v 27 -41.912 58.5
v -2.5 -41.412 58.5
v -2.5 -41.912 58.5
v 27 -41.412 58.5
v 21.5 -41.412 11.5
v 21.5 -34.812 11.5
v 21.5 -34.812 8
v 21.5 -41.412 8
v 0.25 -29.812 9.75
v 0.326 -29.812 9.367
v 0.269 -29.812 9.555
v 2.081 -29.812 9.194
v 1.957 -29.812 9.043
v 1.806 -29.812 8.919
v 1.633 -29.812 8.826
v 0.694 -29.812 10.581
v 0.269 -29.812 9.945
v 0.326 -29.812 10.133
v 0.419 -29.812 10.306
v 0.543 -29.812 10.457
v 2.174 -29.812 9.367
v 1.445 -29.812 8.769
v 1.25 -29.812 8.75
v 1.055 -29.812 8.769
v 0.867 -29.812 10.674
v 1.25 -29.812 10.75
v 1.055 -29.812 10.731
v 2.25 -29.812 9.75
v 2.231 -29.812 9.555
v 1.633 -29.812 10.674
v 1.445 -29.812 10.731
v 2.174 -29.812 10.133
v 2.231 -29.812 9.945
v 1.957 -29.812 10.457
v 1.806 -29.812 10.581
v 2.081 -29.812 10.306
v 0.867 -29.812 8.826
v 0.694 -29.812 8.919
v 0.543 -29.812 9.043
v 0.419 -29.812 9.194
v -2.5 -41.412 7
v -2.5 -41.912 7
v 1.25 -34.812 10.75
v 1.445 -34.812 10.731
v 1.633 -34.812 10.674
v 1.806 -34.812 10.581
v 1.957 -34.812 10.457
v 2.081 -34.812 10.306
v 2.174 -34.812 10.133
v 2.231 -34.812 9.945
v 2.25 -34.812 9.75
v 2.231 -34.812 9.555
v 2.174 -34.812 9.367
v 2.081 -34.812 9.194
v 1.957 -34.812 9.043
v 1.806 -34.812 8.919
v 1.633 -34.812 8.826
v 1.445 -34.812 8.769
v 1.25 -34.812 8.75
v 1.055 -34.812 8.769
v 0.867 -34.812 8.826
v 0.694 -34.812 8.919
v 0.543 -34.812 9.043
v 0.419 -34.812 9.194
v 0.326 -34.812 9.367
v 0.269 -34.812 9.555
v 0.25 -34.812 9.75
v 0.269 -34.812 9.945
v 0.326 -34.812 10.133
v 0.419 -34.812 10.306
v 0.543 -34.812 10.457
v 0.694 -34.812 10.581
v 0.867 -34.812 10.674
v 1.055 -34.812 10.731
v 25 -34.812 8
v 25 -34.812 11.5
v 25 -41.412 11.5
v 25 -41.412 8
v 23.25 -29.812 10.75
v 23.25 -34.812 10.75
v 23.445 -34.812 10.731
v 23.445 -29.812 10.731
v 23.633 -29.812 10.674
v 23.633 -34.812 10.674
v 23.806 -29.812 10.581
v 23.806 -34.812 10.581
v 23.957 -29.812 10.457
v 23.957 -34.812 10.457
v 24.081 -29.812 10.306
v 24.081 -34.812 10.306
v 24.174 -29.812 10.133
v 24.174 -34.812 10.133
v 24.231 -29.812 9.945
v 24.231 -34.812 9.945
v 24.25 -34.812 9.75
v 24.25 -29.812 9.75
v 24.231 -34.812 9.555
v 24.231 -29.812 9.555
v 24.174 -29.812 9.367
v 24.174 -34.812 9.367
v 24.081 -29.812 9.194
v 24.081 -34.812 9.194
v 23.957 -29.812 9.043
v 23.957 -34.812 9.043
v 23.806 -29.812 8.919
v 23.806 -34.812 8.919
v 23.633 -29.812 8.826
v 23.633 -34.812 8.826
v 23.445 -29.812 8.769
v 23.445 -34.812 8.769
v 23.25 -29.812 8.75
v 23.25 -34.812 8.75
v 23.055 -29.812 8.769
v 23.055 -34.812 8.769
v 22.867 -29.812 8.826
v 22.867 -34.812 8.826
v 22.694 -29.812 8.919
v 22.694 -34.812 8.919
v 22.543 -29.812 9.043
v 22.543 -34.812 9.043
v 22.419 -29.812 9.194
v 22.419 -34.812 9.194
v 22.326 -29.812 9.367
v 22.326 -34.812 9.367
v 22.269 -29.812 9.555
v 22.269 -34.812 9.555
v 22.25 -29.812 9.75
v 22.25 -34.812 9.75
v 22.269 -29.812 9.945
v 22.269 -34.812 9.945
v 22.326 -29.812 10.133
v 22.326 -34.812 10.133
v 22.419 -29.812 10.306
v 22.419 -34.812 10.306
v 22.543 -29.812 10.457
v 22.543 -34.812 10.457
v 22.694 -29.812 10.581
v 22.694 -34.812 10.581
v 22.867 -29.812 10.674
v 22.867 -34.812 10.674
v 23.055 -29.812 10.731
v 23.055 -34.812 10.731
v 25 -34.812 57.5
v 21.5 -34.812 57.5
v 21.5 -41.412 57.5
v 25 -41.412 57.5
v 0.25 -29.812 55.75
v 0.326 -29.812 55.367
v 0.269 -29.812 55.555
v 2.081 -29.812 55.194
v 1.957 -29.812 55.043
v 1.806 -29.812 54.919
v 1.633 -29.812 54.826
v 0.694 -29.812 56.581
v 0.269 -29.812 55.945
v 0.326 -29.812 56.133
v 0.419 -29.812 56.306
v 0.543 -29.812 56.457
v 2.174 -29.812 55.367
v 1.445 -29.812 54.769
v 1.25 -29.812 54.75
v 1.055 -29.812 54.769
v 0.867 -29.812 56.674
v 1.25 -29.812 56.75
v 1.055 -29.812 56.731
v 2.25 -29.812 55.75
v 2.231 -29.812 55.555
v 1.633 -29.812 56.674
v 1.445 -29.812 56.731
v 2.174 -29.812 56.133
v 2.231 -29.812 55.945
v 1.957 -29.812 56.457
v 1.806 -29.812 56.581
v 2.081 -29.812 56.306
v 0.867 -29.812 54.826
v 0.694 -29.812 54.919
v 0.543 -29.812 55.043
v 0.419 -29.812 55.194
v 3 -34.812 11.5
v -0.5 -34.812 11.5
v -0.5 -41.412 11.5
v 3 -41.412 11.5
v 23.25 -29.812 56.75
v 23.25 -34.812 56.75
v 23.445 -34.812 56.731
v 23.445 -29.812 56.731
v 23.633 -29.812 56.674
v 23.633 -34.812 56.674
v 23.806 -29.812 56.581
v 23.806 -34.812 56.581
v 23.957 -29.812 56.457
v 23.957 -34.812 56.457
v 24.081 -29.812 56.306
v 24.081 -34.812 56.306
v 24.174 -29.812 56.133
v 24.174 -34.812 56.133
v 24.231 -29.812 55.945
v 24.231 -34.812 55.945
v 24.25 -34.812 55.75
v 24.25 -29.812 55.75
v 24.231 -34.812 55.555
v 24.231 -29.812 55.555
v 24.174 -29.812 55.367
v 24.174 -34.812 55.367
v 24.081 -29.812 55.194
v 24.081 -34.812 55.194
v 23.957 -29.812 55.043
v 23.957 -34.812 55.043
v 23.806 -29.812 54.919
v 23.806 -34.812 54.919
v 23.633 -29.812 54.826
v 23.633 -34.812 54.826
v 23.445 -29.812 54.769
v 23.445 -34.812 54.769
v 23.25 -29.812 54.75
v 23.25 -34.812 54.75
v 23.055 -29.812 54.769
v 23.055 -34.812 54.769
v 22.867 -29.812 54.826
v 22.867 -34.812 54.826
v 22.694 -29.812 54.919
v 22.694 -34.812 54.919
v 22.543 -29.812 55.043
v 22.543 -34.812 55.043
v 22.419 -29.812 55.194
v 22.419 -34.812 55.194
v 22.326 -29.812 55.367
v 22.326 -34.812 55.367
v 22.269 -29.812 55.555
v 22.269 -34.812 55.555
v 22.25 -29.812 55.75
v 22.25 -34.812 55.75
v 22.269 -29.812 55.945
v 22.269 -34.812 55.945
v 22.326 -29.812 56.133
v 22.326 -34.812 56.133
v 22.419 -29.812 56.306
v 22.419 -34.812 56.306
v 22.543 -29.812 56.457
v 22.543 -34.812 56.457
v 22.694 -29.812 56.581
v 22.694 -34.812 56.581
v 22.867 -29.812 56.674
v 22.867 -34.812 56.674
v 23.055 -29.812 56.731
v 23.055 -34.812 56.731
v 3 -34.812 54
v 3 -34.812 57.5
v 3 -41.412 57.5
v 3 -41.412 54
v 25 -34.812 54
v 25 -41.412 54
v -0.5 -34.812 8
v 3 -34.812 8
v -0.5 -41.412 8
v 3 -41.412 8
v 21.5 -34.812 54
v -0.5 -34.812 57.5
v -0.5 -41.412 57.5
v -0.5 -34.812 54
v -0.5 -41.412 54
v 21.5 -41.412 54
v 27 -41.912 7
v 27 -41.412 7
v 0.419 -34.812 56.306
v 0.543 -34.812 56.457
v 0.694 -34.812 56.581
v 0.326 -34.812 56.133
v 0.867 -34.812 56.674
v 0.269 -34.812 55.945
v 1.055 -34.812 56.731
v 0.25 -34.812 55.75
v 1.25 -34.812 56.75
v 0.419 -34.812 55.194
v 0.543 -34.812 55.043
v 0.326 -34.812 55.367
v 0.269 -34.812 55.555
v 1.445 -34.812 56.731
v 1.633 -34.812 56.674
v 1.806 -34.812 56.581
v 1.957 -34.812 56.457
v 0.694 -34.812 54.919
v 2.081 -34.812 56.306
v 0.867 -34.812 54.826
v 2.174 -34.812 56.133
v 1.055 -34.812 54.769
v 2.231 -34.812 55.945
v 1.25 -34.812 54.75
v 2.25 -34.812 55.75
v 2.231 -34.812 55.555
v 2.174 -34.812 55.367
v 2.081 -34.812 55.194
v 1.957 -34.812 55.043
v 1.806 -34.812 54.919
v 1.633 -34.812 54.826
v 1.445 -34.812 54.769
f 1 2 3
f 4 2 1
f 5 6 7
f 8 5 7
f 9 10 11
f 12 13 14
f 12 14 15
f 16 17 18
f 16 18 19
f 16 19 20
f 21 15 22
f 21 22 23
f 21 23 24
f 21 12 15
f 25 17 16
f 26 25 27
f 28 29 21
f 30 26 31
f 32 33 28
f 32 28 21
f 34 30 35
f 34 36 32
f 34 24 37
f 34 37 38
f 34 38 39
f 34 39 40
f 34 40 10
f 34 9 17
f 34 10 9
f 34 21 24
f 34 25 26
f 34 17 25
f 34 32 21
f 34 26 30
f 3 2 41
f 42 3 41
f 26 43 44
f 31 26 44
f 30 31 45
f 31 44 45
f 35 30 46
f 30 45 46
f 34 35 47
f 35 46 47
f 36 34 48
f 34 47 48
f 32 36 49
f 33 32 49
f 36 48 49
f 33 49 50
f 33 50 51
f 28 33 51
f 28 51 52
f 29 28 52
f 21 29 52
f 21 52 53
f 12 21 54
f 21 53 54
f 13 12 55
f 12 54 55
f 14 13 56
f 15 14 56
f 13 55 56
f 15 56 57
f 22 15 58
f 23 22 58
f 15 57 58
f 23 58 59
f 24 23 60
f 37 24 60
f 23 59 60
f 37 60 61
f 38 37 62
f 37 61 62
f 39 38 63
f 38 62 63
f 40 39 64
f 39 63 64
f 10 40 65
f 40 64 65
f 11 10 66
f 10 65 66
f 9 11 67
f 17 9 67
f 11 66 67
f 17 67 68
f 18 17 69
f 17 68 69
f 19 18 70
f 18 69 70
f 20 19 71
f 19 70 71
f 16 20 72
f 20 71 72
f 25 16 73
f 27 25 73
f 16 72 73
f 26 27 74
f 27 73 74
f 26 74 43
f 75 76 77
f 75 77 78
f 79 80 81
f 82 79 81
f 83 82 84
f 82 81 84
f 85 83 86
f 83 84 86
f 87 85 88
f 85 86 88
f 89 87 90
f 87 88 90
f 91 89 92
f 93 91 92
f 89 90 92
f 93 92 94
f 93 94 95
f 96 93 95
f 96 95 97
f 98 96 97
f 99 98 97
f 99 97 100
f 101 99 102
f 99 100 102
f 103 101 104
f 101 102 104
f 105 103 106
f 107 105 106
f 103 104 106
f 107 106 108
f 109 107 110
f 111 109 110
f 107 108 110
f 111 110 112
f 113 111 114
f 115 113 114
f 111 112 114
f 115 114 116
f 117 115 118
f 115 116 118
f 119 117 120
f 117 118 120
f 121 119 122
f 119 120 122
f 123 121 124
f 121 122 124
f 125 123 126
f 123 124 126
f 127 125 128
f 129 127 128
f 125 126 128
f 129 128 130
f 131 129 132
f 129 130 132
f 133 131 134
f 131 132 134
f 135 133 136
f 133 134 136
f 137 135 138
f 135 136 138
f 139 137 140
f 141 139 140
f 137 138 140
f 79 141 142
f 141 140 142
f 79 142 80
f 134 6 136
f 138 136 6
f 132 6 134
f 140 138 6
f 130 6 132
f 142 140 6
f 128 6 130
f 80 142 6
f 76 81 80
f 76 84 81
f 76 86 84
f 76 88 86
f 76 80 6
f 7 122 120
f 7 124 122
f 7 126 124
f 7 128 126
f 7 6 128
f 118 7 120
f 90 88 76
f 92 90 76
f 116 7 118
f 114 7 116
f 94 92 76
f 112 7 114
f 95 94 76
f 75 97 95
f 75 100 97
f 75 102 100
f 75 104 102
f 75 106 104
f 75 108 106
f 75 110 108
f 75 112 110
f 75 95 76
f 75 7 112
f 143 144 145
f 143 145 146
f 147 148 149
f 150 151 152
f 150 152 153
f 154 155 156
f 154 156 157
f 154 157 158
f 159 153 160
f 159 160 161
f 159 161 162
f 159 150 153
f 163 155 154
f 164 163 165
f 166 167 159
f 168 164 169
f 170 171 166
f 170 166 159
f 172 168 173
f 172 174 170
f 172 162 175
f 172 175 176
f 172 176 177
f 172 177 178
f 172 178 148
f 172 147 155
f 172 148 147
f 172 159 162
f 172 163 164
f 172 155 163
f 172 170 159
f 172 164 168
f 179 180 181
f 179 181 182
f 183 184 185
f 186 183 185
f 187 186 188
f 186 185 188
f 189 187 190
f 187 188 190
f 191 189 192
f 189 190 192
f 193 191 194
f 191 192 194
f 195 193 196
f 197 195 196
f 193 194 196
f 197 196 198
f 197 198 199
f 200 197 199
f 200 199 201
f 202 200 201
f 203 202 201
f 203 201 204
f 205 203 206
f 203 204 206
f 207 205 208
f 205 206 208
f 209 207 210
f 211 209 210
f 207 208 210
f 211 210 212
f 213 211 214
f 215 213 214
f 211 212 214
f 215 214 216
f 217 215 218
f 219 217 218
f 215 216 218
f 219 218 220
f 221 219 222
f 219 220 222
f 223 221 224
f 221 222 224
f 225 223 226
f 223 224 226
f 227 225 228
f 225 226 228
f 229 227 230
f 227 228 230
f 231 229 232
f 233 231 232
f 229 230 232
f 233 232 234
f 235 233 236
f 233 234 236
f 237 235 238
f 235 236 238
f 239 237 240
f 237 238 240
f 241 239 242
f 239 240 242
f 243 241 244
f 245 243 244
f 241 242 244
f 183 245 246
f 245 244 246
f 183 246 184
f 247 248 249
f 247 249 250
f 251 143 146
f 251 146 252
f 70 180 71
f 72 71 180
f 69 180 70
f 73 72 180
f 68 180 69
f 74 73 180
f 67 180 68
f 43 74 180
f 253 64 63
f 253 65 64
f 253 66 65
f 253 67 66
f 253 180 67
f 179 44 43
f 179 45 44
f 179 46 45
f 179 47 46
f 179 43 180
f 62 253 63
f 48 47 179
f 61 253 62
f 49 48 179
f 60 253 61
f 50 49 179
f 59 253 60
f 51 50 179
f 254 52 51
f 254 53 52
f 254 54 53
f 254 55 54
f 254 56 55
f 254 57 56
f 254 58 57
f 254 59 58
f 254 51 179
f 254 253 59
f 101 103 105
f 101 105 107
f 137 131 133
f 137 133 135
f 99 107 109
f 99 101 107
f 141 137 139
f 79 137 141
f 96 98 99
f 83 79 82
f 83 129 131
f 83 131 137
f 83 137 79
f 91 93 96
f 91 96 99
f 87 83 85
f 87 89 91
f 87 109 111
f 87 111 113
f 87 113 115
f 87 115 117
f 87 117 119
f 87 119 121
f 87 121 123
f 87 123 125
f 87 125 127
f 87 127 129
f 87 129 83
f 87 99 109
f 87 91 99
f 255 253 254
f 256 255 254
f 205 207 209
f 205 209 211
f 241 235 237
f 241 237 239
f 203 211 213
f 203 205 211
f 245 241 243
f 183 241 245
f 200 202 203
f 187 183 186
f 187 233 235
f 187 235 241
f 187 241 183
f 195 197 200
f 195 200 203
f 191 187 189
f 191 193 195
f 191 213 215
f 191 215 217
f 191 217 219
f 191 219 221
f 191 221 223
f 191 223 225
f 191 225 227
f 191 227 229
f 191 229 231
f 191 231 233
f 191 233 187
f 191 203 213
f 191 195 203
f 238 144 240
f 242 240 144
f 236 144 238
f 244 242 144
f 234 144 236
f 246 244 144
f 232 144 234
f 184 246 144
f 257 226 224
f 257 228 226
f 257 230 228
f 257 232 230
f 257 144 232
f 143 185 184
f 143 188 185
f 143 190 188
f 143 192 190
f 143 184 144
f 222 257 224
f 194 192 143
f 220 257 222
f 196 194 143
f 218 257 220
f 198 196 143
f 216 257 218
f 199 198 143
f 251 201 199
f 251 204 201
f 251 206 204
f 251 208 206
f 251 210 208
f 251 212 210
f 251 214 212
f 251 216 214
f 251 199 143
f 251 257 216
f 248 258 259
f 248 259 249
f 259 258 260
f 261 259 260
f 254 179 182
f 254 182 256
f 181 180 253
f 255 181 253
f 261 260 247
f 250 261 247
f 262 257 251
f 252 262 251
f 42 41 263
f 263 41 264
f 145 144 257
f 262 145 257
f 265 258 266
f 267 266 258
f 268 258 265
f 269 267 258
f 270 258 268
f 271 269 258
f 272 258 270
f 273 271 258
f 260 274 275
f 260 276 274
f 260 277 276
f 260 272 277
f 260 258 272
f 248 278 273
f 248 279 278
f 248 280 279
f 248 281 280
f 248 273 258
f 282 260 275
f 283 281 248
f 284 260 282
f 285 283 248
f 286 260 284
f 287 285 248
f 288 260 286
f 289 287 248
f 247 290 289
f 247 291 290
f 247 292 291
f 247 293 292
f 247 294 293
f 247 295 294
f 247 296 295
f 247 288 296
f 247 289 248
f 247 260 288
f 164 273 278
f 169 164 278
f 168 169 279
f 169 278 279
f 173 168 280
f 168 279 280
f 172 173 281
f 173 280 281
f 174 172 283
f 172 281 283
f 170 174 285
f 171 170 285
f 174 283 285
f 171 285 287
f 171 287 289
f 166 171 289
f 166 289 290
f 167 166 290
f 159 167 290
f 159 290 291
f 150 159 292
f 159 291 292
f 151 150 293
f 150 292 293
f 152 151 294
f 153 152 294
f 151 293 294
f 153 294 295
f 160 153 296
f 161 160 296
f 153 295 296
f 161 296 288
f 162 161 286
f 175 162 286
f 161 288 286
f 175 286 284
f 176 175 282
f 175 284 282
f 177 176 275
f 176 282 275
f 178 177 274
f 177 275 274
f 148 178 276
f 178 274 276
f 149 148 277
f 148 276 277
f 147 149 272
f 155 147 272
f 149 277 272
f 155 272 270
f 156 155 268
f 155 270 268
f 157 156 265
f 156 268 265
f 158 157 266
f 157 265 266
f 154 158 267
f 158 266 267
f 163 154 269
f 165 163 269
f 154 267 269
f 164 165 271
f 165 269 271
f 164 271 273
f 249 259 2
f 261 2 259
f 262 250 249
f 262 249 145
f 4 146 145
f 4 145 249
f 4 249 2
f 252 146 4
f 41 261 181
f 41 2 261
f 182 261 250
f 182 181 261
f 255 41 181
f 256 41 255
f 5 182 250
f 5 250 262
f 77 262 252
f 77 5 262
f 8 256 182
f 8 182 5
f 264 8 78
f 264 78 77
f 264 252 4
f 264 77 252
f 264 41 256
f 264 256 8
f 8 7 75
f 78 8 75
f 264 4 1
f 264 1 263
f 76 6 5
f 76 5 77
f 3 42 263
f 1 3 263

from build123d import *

# Parameters (mm, degrees)
SKETCH_1_W          = 140
SKETCH_1_H          = 75
EXTRUDE_1_DEPTH     = 61
SHELL_1_T           = -1.5
SKETCH_3_W          = 130
SKETCH_3_H          = 65
CUT_EXTRUDE_1_DEPTH = 117.308601118
SKETCH_4_W          = 137
SKETCH_4_H          = 2.6
SKETCH_4_H_2        = 3.3
EXTRUDE_2_DEPTH     = 5
SKETCH_5_W          = 2.4
SKETCH_5_H          = 69.4
EXTRUDE_3_DEPTH     = 5
SKETCH_20_W         = 3.5
SKETCH_20_H         = 3.5
EXTRUDE_4_DEPTH     = 6.6
SKETCH_21_R         = 1
EXTRUDE_5_DEPTH     = 5
SKETCH_22_W         = 140
SKETCH_22_H         = 61
SKETCH_22_W_2       = 29.5
SKETCH_22_H_2       = 51.5
CUT_EXTRUDE_4_DEPTH = 100
SKETCH_23_W         = 29.5
SKETCH_23_H         = 51.5
CUT_EXTRUDE_5_DEPTH = 1


with BuildPart() as part:
    # 草图1 → 凸台-拉伸1 (new body)
    with BuildSketch(Plane.XY):
        with Locations((19.248188406, -5.412137681)):
            Rectangle(SKETCH_1_W, SKETCH_1_H)
    extrude(amount=EXTRUDE_1_DEPTH)

    # 抽壳1
    shell_1_openings = [part.faces().sort_by_distance(p)[0] for p in [
        (19.248188406, -5.412137681, 61),
    ]]
    offset(amount=SHELL_1_T, openings=shell_1_openings, kind=Kind.INTERSECTION)

    # 草图3 → 切除-拉伸1 (cut, through all)
    with BuildSketch(Plane(origin=(0, 0, 0), x_dir=(-1, 0, 0), z_dir=(0, 0, -1))):
        with Locations((-19.248188406, -5.412137681)):
            Rectangle(SKETCH_3_W, SKETCH_3_H)
    extrude(amount=-CUT_EXTRUDE_1_DEPTH, mode=Mode.SUBTRACT)

    # 草图4 → 凸台-拉伸2 (add)
    with BuildSketch(Plane.XY.offset(1.5)):
        with Locations((19.248188406, -40.112137681)):
            Rectangle(SKETCH_4_W, SKETCH_4_H)
        with Locations((19.248188406, 28.937862319)):
            Rectangle(SKETCH_4_W, SKETCH_4_H_2)
    extrude(amount=EXTRUDE_2_DEPTH)

    # 草图5 → 凸台-拉伸3 (add)
    with BuildSketch(Plane.XY.offset(1.5)):
        with Locations((-48.051811594, -4.112137681)):
            Rectangle(SKETCH_5_W, SKETCH_5_H)
        with Locations((86.548188406, -4.112137681)):
            Rectangle(SKETCH_5_W, SKETCH_5_H)
    extrude(amount=EXTRUDE_3_DEPTH)

    # 草图20 → 凸台-拉伸4 (add)
    with BuildSketch(Plane(origin=(0, -41.412137681, 0), x_dir=(1, 0, 0), z_dir=(0, 1, 0))):
        with Locations((1.25, -55.75)):
            Rectangle(SKETCH_20_W, SKETCH_20_H)
        with Locations((1.25, -9.75)):
            Rectangle(SKETCH_20_W, SKETCH_20_H)
        with Locations((23.25, -9.75)):
            Rectangle(SKETCH_20_W, SKETCH_20_H)
        with Locations((23.25, -55.75)):
            Rectangle(SKETCH_20_W, SKETCH_20_H)
    extrude(amount=EXTRUDE_4_DEPTH)

    # 草图21 → 凸台-拉伸5 (add)
    with BuildSketch(Plane(origin=(0, -34.812137681, 0), x_dir=(1, 0, 0), z_dir=(0, 1, 0))):
        with Locations(Location((1.25, -55.75, 0), (0, 0, 270))):
            Circle(SKETCH_21_R)
        with Locations(Location((1.25, -9.75, 0), (0, 0, 270))):
            Circle(SKETCH_21_R)
        with Locations(Location((23.25, -9.75, 0), (0, 0, 270))):
            Circle(SKETCH_21_R)
        with Locations(Location((23.25, -55.75, 0), (0, 0, 270))):
            Circle(SKETCH_21_R)
    extrude(amount=EXTRUDE_5_DEPTH)

    # 草图22 → 切除-拉伸4 (cut, symmetric)
    with BuildSketch(Plane(origin=(0, -41.412137681, 0), x_dir=(1, 0, 0), z_dir=(0, 1, 0))):
        with Locations((19.248188406, -30.5)):
            Rectangle(SKETCH_22_W, SKETCH_22_H)
        with Locations((12.25, -32.75)):
            Rectangle(SKETCH_22_W_2, SKETCH_22_H_2, mode=Mode.SUBTRACT)
    extrude(amount=CUT_EXTRUDE_4_DEPTH, both=True, mode=Mode.SUBTRACT)


with BuildPart() as cut_extrude_4_kept_piece:
    # of the separate pieces the step leaves, the one the design keeps (cut_extrude_4_pieces_kept)
    add(part.part.solids().sort_by_distance((27, -42.912137681, 7))[0])

    # 草图23 → 切除-拉伸5 (cut)
    with BuildSketch(Plane.XZ.offset(42.912137681)):
        with Locations((12.25, 32.75)):
            Rectangle(SKETCH_23_W, SKETCH_23_H)
    extrude(amount=-CUT_EXTRUDE_5_DEPTH, mode=Mode.SUBTRACT)


solid = cut_extrude_4_kept_piece.part
